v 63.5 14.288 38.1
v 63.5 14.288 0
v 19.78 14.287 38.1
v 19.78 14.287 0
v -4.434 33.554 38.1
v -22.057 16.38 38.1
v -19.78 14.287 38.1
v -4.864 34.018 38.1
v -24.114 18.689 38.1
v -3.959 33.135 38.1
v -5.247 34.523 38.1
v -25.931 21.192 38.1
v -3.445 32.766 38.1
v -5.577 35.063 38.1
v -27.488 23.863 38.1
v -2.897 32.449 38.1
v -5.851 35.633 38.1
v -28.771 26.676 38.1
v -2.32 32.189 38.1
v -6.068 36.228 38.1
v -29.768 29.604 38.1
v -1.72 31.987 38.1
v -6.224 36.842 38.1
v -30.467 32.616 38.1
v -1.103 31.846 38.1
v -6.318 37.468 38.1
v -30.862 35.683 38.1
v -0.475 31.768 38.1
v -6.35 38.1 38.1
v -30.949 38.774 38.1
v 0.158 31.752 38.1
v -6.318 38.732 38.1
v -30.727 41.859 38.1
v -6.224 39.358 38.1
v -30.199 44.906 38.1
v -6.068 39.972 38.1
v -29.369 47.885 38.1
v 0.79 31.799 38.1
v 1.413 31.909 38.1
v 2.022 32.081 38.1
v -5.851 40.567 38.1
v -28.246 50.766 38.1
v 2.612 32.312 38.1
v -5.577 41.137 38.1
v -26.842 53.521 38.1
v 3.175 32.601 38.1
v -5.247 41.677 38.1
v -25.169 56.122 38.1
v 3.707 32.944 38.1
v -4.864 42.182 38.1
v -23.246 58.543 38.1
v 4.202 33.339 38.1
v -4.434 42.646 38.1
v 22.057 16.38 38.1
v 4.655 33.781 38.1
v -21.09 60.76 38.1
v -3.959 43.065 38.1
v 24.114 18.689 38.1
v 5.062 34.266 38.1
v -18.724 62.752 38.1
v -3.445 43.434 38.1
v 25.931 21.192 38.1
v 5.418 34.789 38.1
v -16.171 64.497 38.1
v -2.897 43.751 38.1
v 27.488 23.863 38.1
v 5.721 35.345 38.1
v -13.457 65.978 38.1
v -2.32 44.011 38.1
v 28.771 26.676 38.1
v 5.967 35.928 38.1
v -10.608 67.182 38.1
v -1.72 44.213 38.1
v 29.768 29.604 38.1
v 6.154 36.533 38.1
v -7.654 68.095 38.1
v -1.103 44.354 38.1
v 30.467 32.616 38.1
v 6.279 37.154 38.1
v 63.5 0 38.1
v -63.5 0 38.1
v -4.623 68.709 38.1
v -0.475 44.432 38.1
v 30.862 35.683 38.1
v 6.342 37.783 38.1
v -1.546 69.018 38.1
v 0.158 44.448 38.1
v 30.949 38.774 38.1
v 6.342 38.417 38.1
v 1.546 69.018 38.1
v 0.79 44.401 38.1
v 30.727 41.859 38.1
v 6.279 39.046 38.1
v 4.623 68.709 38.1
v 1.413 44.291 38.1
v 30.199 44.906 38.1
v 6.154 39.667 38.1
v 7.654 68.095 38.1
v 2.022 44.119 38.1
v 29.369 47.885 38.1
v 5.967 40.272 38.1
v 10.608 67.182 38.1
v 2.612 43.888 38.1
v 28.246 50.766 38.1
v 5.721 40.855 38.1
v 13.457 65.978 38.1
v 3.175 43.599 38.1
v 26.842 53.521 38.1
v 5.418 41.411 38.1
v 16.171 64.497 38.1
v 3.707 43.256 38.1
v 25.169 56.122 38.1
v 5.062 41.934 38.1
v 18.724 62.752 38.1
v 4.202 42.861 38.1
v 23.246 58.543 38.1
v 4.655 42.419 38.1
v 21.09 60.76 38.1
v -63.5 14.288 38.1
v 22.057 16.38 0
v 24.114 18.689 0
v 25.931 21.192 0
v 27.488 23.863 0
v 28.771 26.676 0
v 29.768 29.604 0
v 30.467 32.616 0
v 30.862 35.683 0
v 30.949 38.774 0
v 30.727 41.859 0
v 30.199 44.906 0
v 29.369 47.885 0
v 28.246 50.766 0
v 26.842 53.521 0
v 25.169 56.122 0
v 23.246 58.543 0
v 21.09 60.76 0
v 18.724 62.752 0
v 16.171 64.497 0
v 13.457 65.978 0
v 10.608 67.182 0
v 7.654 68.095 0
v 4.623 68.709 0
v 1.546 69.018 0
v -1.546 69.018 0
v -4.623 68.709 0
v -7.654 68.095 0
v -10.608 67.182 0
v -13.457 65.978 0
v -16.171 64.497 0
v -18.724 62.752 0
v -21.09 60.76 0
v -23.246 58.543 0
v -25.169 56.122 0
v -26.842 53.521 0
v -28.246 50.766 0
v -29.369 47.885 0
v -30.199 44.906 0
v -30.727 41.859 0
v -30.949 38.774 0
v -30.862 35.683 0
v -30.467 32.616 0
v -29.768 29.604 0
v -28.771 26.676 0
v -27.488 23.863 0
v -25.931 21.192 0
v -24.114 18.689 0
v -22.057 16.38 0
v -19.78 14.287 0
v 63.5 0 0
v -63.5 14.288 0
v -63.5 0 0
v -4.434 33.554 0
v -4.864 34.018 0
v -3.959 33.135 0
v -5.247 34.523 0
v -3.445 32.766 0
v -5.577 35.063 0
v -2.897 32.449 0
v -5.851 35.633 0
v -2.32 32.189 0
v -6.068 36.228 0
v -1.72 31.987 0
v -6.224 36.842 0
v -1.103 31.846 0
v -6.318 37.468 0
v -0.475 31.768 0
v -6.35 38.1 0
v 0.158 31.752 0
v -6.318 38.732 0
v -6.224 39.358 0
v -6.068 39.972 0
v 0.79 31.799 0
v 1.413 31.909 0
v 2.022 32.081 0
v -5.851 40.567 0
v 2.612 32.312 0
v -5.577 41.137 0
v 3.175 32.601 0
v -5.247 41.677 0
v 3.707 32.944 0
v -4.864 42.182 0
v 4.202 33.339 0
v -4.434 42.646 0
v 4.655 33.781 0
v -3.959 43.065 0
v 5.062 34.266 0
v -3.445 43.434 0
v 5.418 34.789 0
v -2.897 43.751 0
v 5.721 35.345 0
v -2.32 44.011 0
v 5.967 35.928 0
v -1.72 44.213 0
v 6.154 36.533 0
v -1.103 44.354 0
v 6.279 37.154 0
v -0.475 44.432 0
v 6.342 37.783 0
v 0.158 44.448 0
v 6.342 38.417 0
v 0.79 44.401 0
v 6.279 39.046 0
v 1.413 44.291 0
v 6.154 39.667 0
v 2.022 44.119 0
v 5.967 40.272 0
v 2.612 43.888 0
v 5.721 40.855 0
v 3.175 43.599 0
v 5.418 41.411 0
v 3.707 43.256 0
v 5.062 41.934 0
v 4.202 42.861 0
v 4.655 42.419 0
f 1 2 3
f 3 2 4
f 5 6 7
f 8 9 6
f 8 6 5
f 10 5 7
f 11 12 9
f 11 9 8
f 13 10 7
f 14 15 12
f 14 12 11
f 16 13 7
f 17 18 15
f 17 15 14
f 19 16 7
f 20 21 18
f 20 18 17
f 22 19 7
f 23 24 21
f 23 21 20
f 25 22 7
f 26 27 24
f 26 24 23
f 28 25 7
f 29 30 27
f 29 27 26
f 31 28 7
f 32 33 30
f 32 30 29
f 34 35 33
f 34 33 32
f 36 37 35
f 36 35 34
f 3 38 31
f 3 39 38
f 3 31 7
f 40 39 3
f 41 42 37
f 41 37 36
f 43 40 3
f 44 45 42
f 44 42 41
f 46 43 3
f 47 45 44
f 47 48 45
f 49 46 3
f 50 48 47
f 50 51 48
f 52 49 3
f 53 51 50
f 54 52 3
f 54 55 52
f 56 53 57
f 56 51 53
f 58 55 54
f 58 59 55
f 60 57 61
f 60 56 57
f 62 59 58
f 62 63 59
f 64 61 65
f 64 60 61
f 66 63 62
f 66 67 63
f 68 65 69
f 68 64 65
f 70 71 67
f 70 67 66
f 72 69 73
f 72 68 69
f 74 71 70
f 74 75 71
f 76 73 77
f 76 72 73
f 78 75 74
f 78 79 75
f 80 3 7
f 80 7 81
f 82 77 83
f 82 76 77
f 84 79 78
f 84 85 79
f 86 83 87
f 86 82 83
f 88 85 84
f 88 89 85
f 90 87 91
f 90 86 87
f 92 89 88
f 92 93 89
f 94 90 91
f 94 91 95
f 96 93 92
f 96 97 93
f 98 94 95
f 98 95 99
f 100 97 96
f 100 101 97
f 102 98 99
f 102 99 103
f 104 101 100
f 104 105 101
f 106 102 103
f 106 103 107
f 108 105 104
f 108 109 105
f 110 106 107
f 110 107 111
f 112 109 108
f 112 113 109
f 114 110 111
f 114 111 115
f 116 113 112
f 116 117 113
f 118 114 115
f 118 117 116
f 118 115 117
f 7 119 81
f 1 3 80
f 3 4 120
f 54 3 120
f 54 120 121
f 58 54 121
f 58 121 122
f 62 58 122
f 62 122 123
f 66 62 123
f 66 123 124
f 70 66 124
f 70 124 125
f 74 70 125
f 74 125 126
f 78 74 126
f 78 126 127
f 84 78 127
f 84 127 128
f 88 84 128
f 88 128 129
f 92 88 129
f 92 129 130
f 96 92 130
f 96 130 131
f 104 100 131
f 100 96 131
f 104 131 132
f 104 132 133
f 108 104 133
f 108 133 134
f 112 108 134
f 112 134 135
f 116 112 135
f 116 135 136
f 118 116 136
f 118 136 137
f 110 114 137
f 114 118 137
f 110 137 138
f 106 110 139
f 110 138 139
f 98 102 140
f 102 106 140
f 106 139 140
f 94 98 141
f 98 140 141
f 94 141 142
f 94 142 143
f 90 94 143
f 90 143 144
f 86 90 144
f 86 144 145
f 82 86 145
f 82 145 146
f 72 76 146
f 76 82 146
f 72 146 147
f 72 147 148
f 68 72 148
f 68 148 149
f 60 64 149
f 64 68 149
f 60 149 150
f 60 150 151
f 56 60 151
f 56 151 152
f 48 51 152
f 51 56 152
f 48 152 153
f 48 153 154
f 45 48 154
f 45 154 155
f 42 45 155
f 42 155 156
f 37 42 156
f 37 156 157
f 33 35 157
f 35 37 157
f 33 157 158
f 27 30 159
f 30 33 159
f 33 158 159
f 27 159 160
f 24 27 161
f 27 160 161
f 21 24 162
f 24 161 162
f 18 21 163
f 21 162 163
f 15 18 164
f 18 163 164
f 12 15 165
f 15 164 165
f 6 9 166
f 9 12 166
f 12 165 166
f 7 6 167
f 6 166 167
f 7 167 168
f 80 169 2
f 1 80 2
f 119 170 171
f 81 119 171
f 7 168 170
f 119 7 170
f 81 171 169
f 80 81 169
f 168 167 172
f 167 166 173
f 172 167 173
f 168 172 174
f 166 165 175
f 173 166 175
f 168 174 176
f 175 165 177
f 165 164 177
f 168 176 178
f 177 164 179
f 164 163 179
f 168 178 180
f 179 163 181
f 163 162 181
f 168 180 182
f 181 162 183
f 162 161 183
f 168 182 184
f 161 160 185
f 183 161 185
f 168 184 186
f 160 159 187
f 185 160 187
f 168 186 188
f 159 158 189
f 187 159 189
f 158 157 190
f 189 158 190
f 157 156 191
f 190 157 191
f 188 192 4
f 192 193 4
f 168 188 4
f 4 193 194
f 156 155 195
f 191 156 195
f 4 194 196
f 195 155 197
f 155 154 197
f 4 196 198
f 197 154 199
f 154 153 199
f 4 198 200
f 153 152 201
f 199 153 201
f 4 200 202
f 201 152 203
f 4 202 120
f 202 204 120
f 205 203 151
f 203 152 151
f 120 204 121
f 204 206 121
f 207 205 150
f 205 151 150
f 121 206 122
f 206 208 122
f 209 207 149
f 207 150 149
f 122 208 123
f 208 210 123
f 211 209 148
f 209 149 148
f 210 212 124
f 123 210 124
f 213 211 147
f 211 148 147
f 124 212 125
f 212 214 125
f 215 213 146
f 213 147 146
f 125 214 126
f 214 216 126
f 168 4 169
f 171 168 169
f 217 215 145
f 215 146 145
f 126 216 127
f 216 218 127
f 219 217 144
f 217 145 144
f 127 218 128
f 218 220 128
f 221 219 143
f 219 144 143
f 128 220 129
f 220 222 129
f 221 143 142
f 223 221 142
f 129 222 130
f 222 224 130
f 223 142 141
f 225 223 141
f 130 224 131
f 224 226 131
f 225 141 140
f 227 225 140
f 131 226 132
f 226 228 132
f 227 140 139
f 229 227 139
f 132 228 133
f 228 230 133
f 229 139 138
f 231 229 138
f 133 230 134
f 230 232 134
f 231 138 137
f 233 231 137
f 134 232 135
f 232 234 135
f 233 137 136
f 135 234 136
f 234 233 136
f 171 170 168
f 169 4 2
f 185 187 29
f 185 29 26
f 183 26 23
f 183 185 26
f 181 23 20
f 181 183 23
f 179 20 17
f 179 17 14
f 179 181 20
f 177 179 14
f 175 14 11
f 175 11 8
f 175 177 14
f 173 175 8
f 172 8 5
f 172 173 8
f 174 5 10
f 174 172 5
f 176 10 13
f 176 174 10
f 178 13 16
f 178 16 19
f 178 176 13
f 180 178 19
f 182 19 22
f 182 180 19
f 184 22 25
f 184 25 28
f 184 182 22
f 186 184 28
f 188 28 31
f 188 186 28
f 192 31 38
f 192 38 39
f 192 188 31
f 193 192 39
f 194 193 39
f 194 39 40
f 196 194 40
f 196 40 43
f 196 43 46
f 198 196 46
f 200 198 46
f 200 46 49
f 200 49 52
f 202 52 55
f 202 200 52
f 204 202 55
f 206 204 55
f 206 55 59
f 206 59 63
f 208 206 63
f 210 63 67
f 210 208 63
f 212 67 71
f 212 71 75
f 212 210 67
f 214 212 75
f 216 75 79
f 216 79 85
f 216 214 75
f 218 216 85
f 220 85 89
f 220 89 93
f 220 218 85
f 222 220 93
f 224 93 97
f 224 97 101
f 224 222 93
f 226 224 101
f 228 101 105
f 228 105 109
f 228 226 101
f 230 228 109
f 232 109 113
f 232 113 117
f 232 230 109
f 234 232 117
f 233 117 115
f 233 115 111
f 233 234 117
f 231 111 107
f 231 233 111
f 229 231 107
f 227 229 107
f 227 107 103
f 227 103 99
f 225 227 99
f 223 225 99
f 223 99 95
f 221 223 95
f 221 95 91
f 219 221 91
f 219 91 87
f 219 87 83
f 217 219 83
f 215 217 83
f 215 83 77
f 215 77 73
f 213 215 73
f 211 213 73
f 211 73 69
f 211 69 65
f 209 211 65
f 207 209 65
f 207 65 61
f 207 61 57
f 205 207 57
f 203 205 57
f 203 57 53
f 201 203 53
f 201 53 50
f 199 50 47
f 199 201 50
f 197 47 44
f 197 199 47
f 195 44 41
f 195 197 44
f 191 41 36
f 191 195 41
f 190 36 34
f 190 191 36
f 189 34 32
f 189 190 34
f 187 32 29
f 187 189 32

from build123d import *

# Parameters (mm, degrees)
SKETCH1_R           = 30.95625
SKETCH1_R_2         = 6.35
BOSS_EXTRUDE1_DEPTH = 38.1


with BuildPart() as part:
    # Sketch1 → Boss-Extrude1 (new body)
    # profile 1 of 2: a face of its own
    with BuildSketch(Plane.XY):
        with Locations((0, 38.1)):
            Circle(SKETCH1_R)
        with Locations(Location((0, 38.1, 0), (0, 0, 180))):
            Circle(SKETCH1_R_2, mode=Mode.SUBTRACT)
    # profile 2 of 2: a face of its own
    with BuildSketch(Plane.XY):
        with BuildLine():
            Line((-63.5, 14.2875), (-63.5, 0))
            Line((-63.5, 0), (63.5, 0))
            Line((63.5, 0), (63.5, 14.2875))
            Line((63.5, 14.2875), (19.780148074, 14.2875))
            ThreePointArc((19.780148074, 14.2875), (0, 7.14375), (-19.780148074, 14.2875))
            Line((-19.780148074, 14.2875), (-63.5, 14.2875))
        make_face()
    extrude(amount=BOSS_EXTRUDE1_DEPTH)


solid = part.part
